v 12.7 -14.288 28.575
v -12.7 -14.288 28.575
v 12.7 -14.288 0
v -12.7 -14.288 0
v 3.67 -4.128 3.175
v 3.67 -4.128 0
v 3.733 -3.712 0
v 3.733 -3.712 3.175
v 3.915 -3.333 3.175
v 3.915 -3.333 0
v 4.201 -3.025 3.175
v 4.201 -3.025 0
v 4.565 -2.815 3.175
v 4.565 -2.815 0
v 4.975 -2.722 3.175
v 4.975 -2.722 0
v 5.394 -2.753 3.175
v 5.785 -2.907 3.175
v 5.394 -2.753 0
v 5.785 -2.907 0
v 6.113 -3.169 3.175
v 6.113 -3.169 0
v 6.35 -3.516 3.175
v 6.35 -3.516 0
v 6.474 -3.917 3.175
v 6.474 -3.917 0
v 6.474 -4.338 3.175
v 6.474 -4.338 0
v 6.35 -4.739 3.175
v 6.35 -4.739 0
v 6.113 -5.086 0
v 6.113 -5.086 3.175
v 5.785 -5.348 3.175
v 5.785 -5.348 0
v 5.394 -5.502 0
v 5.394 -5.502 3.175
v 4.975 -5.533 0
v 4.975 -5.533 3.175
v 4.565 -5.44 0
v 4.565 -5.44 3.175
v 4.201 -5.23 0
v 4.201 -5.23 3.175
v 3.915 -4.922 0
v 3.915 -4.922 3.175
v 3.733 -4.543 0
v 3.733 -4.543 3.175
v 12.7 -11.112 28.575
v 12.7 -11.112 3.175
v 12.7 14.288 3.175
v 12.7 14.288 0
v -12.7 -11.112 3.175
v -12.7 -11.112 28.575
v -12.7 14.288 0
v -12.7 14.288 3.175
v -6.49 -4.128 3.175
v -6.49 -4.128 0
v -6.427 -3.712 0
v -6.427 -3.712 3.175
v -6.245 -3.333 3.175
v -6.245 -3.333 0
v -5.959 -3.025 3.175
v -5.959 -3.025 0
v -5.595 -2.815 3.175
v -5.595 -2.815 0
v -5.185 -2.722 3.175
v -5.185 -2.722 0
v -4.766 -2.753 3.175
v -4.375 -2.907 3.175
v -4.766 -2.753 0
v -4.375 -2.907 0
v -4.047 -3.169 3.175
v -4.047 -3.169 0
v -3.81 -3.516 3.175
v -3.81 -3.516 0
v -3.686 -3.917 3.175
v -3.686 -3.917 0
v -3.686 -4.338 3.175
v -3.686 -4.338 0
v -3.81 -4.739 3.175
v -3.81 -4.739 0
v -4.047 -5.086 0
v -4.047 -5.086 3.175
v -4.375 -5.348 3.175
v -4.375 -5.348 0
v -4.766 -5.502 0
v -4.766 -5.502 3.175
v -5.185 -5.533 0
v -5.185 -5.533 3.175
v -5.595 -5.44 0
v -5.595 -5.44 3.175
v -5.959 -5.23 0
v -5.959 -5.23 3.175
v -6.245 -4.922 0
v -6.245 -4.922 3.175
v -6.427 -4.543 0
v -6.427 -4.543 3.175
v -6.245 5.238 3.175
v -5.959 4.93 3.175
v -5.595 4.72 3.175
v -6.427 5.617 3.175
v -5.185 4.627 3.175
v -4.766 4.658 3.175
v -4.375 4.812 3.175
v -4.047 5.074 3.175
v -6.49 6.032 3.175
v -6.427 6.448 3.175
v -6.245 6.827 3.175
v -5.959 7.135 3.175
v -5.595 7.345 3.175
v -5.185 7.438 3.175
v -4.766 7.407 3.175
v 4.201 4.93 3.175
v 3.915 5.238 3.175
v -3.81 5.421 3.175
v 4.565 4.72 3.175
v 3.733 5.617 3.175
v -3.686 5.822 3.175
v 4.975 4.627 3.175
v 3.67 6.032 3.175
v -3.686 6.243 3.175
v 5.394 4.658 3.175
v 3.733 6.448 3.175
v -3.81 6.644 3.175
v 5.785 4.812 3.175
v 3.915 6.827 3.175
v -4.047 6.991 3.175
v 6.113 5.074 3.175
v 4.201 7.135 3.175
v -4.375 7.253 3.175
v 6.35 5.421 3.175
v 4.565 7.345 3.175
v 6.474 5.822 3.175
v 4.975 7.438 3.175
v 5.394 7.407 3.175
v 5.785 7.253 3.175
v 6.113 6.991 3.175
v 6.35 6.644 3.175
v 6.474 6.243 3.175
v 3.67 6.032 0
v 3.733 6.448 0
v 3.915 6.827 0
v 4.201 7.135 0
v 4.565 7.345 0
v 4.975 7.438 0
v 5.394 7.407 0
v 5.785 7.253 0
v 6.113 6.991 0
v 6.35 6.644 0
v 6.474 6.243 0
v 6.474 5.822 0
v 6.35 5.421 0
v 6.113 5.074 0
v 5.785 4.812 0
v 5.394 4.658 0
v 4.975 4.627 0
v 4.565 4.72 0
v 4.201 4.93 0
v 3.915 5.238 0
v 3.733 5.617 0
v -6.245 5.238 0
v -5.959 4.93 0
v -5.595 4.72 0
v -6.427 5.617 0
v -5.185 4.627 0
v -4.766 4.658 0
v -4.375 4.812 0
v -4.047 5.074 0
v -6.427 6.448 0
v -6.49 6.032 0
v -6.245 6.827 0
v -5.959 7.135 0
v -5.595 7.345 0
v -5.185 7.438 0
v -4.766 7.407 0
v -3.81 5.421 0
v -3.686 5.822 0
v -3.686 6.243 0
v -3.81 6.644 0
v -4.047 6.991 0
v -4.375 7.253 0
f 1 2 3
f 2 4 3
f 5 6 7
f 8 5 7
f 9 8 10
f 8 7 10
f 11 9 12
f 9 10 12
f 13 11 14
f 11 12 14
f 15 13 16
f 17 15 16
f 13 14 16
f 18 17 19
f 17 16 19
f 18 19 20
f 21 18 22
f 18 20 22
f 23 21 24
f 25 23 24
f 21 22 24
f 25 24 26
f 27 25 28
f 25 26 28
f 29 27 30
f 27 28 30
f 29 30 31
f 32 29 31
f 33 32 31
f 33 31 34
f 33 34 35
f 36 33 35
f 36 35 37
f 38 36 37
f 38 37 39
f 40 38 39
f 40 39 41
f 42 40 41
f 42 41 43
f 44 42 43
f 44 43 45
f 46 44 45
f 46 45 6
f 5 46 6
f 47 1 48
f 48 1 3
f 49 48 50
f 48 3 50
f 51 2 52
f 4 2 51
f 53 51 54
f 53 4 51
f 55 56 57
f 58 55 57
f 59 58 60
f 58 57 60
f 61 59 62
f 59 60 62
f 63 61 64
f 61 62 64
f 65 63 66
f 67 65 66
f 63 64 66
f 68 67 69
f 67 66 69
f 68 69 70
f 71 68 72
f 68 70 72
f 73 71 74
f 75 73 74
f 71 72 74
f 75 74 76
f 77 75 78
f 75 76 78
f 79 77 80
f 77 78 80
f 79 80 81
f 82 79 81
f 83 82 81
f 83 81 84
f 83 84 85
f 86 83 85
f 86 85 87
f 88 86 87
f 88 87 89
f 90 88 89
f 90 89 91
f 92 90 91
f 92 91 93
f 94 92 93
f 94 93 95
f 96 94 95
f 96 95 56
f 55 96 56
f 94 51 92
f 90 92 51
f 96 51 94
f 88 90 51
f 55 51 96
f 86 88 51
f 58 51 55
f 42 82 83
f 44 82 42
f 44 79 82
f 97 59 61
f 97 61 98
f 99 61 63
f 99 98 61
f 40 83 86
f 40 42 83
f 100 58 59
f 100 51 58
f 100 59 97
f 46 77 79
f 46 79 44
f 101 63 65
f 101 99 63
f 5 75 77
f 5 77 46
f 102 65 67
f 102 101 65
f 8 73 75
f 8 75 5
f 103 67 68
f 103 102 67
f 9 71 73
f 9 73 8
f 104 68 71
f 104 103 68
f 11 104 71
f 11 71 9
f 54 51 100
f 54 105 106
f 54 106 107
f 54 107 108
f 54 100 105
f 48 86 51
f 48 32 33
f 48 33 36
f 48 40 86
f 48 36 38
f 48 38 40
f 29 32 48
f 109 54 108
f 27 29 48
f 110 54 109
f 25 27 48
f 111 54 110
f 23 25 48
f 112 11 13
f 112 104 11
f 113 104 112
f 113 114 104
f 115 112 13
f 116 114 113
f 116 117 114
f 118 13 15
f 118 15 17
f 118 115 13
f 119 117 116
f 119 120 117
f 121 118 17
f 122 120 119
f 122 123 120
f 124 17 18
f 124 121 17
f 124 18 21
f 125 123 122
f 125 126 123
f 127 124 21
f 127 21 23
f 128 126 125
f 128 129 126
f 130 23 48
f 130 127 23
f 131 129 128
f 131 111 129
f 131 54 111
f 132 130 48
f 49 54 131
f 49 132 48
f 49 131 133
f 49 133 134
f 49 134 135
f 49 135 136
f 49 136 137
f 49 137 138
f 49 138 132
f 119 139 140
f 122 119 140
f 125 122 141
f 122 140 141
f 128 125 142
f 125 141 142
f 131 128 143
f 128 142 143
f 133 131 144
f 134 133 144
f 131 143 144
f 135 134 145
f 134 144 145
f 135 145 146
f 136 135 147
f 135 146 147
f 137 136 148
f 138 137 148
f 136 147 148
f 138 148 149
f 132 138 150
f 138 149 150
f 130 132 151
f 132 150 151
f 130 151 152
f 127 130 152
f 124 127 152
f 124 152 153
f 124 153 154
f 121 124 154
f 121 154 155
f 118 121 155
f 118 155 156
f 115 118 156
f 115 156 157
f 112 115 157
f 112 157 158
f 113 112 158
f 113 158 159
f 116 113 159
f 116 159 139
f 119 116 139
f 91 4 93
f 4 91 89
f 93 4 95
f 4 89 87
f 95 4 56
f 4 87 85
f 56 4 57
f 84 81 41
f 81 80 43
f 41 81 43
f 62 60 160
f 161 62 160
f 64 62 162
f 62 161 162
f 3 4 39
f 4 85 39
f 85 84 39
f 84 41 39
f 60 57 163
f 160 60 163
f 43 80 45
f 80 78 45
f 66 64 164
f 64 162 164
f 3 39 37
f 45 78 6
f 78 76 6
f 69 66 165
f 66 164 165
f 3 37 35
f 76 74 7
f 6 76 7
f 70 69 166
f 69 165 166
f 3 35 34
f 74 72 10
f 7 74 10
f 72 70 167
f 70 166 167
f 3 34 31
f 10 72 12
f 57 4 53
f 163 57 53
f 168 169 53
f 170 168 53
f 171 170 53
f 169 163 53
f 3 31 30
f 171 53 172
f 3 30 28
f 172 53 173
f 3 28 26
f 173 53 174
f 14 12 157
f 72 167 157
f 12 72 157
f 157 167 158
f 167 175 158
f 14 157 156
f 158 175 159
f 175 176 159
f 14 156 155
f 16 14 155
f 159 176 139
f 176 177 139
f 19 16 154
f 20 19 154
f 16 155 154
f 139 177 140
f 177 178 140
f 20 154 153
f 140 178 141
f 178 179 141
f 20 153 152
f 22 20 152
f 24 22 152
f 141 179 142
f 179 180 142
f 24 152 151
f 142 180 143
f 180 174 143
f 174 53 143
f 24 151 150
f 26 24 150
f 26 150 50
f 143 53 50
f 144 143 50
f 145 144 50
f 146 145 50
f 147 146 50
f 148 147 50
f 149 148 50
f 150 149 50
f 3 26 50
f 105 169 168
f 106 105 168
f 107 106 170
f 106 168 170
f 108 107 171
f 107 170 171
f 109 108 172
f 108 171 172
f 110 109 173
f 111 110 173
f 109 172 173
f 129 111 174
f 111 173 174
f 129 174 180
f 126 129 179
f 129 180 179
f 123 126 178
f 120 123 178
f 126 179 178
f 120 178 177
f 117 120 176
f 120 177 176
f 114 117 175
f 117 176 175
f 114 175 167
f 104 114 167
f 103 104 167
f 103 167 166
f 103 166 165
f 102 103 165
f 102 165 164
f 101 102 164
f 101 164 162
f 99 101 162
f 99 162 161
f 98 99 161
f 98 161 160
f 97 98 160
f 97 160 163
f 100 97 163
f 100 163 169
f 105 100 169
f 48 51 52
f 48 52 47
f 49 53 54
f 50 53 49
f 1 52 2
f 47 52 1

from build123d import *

# Parameters (mm, degrees)
SKETCH1_W            = 25.4
SKETCH1_H            = 28.575
BOSS_EXTRUDE1_DEPTH  = 3.175
SKETCH2_W            = 25.4
SKETCH2_H            = 3.175
BOSS_EXTRUDE2_DEPTH  = 25.4
SKETCH4_R            = 1.4097
CUT_EXTRUDE1_DEPTH   = 29.575
LPATTERN1_COUNT      = 2
LPATTERN1_PITCH      = 10.16
LPATTERN1_COUNT_DIR2 = 2
LPATTERN1_PITCH_DIR2 = 10.16


with BuildPart() as part:
    # Sketch1 → Boss-Extrude1 (new body)
    with BuildSketch(Plane.XY):
        Rectangle(SKETCH1_W, SKETCH1_H)
    extrude(amount=BOSS_EXTRUDE1_DEPTH)

    # Sketch2 → Boss-Extrude2 (add)
    with BuildSketch(Plane.XY.offset(3.175)):
        with Locations((0, -12.7)):
            Rectangle(SKETCH2_W, SKETCH2_H)
    extrude(amount=BOSS_EXTRUDE2_DEPTH)

    # Sketch4 → Cut-Extrude1 (cut, through all)
    with BuildSketch(Plane(origin=(0, 0, 0), x_dir=(-1, 0, 0), z_dir=(0, 0, -1))):
        with Locations((-5.08, 6.0325)):
            Circle(SKETCH4_R)
    cut_extrude1 = extrude(amount=-CUT_EXTRUDE1_DEPTH, mode=Mode.SUBTRACT)

    # LPattern1: Cut-Extrude1 2 × 2
    with Locations(*[(-j * LPATTERN1_PITCH_DIR2, -i * LPATTERN1_PITCH, 0) for i in range(LPATTERN1_COUNT) for j in range(LPATTERN1_COUNT_DIR2) if (i, j) != (0, 0)]):
        add(cut_extrude1, mode=Mode.SUBTRACT)


solid = part.part
